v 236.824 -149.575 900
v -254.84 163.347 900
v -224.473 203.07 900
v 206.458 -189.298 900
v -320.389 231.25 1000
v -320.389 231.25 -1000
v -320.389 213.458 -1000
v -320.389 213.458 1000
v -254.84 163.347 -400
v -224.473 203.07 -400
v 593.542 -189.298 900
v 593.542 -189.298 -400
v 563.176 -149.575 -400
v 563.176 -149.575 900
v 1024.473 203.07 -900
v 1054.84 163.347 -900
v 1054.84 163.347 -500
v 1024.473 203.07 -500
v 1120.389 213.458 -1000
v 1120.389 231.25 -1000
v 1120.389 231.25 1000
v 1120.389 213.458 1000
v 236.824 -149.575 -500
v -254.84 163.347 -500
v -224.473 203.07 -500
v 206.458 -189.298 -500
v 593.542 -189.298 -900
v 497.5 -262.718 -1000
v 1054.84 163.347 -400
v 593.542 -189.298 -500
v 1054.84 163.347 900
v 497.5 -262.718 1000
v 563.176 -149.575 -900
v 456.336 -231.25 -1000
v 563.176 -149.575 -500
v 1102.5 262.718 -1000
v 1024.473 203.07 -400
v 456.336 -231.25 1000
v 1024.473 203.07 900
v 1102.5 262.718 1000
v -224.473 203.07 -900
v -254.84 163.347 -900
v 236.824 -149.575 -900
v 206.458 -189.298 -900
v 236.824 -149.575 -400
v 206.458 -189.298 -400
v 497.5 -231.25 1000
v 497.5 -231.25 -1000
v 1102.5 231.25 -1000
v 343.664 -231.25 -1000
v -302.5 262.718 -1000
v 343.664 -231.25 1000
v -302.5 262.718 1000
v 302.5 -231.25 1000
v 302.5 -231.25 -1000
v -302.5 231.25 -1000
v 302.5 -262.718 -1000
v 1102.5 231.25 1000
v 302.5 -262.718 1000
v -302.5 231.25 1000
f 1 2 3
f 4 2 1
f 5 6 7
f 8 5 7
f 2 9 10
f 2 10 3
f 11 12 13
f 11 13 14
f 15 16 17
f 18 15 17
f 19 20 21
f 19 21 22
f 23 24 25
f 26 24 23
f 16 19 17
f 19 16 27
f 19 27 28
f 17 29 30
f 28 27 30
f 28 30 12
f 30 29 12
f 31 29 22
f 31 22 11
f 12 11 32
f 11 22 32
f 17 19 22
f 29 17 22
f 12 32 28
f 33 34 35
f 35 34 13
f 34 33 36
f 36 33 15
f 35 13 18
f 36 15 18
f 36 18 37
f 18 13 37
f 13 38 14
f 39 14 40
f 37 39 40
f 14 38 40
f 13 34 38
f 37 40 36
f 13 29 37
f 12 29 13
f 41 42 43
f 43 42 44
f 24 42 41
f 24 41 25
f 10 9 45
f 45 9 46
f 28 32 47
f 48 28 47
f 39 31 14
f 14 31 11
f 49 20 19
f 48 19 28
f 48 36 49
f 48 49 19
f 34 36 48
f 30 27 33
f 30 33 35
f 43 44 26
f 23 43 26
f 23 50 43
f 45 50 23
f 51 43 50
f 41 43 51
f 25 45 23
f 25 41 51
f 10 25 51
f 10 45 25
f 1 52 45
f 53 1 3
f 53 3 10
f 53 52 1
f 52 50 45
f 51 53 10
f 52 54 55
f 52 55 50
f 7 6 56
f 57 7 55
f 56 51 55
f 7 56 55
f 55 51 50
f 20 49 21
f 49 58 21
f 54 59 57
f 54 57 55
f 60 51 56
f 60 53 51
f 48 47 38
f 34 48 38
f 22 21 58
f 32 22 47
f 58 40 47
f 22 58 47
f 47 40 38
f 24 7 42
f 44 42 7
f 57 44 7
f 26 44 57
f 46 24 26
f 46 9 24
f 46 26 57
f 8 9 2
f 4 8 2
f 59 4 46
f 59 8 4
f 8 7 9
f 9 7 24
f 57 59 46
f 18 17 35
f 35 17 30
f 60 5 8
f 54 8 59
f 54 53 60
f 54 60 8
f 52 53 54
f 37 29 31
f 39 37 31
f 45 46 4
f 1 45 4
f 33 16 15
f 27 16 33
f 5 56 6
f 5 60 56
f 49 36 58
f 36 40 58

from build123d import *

# Parameters (mm, degrees)
F1_DEPTH      = 1000
F1_DEPTH_BACK = 1000
F3_W          = 580.6498229504
F3_H          = 1300
F3_H_2        = 400
F4_DEPTH      = 442.4345898662


with BuildPart() as f1:
    # F0 (on Top) → F1 (new body, two sides)
    with BuildSketch(Plane.XY) as f1_sk:
        Polygon((-320.3894793987, 231.25), (-320.3894793987, 213.4575700915), (302.5, -262.7182715976), (302.5, -231.25), (343.663901225, -231.25), (-281.9180493875, 246.9841357988), (-302.5, 262.7182715976), (-302.5, 231.25), align=None)
    extrude(amount=F1_DEPTH)
    extrude(f1_sk.sketch, amount=-F1_DEPTH_BACK)

    # F3 (on face) → F4 (cut, through all)
    with BuildSketch(Plane(origin=(-15.1832061928, -19.8612751279, 0), x_dir=(0.7944510051, -0.6073282477, 0), z_dir=(-0.6073282477, -0.7944510051, 0))):
        with Locations((-11.3382488489, 250)):
            Rectangle(F3_W, F3_H)
        with Locations((-11.3382488489, -700)):
            Rectangle(F3_W, F3_H_2)
    extrude(amount=-F4_DEPTH, mode=Mode.SUBTRACT)


with BuildPart() as f6_1:
    # F6: instance of F1
    add(f1.part.mirror(Plane.YZ.offset(400)))


solid = Compound([f1.part, f6_1.part])
